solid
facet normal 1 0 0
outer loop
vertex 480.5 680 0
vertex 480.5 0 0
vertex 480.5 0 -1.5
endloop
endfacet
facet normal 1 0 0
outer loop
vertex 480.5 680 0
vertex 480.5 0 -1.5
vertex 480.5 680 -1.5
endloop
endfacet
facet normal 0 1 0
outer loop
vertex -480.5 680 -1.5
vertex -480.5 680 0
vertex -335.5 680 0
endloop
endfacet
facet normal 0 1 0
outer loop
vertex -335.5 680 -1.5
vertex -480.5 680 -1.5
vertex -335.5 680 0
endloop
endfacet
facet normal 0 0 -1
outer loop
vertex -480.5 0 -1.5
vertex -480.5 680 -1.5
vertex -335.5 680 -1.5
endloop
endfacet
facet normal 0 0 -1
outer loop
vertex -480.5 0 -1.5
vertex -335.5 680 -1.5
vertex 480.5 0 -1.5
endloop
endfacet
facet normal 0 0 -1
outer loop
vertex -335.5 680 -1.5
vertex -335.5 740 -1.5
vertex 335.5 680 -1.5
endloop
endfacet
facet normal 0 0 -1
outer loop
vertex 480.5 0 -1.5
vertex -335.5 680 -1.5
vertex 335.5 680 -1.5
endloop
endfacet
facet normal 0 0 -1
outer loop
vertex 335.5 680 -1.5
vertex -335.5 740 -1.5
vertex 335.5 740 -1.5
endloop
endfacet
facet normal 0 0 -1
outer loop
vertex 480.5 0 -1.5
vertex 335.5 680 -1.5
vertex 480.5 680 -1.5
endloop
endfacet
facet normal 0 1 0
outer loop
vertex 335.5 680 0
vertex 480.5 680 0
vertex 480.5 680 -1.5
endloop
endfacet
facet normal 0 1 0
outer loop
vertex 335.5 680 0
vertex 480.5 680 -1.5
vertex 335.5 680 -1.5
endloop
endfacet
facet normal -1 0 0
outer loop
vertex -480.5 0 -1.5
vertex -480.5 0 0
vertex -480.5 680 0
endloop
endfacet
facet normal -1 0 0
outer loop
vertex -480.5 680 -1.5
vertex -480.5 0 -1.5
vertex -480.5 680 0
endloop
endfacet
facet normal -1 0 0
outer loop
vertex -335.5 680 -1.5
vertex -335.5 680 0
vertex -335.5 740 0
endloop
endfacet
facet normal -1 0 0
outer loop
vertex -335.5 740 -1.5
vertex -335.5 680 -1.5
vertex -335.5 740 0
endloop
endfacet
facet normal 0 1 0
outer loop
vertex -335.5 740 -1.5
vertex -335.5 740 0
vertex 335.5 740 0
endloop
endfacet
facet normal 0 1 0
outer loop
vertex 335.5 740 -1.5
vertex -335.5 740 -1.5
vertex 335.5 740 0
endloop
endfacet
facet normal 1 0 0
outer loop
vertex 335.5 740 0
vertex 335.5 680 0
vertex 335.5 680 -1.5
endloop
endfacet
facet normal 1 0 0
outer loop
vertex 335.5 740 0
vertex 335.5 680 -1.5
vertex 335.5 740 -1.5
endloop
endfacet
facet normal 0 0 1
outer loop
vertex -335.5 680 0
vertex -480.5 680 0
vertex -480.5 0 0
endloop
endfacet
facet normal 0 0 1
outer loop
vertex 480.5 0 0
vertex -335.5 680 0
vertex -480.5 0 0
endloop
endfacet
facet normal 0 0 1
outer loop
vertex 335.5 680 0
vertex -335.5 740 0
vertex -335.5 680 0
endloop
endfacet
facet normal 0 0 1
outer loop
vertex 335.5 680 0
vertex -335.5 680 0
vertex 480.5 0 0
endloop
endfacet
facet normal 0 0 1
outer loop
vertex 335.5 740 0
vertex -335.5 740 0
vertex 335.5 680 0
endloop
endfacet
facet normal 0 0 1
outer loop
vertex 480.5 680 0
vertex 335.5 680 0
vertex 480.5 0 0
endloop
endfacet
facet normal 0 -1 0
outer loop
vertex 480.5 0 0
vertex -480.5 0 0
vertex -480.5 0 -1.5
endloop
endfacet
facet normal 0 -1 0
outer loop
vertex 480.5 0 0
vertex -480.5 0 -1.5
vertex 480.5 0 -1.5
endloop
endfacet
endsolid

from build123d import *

# Parameters (mm, degrees)
SKETCH1_W          = 961
SKETCH1_H          = 740
BASE_FLANGE1_DEPTH = 1.5
CUT_EXTRUDE1_REACH = 884.317
SKETCH2_W          = 145
SKETCH2_H          = 60


# Sheet-metal steps are written as plain solids
with BuildPart() as part:
    # Sketch1 → Base-Flange1 (new body)
    with BuildSketch(Plane.XY):
        with Locations((0, 370)):
            Rectangle(SKETCH1_W, SKETCH1_H)
    extrude(amount=-BASE_FLANGE1_DEPTH)

    # Sketch2 → Cut-Extrude1 (cut, up to next)
    with BuildSketch(Plane.XY, mode=Mode.PRIVATE) as cut_extrude1_sk1:
        with Locations((-408, 710)):
            Rectangle(SKETCH2_W, SKETCH2_H)
    cut_extrude1_tool1 = extrude(cut_extrude1_sk1.sketch, amount=-CUT_EXTRUDE1_REACH, mode=Mode.PRIVATE) & part.part
    cut_extrude1 = cut_extrude1_tool1.solids().sort_by_distance((-408, 710, 0))[0]
    add(cut_extrude1, mode=Mode.SUBTRACT)

    # Mirror1: Cut-Extrude1 across plane
    add(cut_extrude1.mirror(Plane(origin=(0, 0, 0), x_dir=(0, 0, 1), z_dir=(1, 0, 0))), mode=Mode.SUBTRACT)


solid = part.part
